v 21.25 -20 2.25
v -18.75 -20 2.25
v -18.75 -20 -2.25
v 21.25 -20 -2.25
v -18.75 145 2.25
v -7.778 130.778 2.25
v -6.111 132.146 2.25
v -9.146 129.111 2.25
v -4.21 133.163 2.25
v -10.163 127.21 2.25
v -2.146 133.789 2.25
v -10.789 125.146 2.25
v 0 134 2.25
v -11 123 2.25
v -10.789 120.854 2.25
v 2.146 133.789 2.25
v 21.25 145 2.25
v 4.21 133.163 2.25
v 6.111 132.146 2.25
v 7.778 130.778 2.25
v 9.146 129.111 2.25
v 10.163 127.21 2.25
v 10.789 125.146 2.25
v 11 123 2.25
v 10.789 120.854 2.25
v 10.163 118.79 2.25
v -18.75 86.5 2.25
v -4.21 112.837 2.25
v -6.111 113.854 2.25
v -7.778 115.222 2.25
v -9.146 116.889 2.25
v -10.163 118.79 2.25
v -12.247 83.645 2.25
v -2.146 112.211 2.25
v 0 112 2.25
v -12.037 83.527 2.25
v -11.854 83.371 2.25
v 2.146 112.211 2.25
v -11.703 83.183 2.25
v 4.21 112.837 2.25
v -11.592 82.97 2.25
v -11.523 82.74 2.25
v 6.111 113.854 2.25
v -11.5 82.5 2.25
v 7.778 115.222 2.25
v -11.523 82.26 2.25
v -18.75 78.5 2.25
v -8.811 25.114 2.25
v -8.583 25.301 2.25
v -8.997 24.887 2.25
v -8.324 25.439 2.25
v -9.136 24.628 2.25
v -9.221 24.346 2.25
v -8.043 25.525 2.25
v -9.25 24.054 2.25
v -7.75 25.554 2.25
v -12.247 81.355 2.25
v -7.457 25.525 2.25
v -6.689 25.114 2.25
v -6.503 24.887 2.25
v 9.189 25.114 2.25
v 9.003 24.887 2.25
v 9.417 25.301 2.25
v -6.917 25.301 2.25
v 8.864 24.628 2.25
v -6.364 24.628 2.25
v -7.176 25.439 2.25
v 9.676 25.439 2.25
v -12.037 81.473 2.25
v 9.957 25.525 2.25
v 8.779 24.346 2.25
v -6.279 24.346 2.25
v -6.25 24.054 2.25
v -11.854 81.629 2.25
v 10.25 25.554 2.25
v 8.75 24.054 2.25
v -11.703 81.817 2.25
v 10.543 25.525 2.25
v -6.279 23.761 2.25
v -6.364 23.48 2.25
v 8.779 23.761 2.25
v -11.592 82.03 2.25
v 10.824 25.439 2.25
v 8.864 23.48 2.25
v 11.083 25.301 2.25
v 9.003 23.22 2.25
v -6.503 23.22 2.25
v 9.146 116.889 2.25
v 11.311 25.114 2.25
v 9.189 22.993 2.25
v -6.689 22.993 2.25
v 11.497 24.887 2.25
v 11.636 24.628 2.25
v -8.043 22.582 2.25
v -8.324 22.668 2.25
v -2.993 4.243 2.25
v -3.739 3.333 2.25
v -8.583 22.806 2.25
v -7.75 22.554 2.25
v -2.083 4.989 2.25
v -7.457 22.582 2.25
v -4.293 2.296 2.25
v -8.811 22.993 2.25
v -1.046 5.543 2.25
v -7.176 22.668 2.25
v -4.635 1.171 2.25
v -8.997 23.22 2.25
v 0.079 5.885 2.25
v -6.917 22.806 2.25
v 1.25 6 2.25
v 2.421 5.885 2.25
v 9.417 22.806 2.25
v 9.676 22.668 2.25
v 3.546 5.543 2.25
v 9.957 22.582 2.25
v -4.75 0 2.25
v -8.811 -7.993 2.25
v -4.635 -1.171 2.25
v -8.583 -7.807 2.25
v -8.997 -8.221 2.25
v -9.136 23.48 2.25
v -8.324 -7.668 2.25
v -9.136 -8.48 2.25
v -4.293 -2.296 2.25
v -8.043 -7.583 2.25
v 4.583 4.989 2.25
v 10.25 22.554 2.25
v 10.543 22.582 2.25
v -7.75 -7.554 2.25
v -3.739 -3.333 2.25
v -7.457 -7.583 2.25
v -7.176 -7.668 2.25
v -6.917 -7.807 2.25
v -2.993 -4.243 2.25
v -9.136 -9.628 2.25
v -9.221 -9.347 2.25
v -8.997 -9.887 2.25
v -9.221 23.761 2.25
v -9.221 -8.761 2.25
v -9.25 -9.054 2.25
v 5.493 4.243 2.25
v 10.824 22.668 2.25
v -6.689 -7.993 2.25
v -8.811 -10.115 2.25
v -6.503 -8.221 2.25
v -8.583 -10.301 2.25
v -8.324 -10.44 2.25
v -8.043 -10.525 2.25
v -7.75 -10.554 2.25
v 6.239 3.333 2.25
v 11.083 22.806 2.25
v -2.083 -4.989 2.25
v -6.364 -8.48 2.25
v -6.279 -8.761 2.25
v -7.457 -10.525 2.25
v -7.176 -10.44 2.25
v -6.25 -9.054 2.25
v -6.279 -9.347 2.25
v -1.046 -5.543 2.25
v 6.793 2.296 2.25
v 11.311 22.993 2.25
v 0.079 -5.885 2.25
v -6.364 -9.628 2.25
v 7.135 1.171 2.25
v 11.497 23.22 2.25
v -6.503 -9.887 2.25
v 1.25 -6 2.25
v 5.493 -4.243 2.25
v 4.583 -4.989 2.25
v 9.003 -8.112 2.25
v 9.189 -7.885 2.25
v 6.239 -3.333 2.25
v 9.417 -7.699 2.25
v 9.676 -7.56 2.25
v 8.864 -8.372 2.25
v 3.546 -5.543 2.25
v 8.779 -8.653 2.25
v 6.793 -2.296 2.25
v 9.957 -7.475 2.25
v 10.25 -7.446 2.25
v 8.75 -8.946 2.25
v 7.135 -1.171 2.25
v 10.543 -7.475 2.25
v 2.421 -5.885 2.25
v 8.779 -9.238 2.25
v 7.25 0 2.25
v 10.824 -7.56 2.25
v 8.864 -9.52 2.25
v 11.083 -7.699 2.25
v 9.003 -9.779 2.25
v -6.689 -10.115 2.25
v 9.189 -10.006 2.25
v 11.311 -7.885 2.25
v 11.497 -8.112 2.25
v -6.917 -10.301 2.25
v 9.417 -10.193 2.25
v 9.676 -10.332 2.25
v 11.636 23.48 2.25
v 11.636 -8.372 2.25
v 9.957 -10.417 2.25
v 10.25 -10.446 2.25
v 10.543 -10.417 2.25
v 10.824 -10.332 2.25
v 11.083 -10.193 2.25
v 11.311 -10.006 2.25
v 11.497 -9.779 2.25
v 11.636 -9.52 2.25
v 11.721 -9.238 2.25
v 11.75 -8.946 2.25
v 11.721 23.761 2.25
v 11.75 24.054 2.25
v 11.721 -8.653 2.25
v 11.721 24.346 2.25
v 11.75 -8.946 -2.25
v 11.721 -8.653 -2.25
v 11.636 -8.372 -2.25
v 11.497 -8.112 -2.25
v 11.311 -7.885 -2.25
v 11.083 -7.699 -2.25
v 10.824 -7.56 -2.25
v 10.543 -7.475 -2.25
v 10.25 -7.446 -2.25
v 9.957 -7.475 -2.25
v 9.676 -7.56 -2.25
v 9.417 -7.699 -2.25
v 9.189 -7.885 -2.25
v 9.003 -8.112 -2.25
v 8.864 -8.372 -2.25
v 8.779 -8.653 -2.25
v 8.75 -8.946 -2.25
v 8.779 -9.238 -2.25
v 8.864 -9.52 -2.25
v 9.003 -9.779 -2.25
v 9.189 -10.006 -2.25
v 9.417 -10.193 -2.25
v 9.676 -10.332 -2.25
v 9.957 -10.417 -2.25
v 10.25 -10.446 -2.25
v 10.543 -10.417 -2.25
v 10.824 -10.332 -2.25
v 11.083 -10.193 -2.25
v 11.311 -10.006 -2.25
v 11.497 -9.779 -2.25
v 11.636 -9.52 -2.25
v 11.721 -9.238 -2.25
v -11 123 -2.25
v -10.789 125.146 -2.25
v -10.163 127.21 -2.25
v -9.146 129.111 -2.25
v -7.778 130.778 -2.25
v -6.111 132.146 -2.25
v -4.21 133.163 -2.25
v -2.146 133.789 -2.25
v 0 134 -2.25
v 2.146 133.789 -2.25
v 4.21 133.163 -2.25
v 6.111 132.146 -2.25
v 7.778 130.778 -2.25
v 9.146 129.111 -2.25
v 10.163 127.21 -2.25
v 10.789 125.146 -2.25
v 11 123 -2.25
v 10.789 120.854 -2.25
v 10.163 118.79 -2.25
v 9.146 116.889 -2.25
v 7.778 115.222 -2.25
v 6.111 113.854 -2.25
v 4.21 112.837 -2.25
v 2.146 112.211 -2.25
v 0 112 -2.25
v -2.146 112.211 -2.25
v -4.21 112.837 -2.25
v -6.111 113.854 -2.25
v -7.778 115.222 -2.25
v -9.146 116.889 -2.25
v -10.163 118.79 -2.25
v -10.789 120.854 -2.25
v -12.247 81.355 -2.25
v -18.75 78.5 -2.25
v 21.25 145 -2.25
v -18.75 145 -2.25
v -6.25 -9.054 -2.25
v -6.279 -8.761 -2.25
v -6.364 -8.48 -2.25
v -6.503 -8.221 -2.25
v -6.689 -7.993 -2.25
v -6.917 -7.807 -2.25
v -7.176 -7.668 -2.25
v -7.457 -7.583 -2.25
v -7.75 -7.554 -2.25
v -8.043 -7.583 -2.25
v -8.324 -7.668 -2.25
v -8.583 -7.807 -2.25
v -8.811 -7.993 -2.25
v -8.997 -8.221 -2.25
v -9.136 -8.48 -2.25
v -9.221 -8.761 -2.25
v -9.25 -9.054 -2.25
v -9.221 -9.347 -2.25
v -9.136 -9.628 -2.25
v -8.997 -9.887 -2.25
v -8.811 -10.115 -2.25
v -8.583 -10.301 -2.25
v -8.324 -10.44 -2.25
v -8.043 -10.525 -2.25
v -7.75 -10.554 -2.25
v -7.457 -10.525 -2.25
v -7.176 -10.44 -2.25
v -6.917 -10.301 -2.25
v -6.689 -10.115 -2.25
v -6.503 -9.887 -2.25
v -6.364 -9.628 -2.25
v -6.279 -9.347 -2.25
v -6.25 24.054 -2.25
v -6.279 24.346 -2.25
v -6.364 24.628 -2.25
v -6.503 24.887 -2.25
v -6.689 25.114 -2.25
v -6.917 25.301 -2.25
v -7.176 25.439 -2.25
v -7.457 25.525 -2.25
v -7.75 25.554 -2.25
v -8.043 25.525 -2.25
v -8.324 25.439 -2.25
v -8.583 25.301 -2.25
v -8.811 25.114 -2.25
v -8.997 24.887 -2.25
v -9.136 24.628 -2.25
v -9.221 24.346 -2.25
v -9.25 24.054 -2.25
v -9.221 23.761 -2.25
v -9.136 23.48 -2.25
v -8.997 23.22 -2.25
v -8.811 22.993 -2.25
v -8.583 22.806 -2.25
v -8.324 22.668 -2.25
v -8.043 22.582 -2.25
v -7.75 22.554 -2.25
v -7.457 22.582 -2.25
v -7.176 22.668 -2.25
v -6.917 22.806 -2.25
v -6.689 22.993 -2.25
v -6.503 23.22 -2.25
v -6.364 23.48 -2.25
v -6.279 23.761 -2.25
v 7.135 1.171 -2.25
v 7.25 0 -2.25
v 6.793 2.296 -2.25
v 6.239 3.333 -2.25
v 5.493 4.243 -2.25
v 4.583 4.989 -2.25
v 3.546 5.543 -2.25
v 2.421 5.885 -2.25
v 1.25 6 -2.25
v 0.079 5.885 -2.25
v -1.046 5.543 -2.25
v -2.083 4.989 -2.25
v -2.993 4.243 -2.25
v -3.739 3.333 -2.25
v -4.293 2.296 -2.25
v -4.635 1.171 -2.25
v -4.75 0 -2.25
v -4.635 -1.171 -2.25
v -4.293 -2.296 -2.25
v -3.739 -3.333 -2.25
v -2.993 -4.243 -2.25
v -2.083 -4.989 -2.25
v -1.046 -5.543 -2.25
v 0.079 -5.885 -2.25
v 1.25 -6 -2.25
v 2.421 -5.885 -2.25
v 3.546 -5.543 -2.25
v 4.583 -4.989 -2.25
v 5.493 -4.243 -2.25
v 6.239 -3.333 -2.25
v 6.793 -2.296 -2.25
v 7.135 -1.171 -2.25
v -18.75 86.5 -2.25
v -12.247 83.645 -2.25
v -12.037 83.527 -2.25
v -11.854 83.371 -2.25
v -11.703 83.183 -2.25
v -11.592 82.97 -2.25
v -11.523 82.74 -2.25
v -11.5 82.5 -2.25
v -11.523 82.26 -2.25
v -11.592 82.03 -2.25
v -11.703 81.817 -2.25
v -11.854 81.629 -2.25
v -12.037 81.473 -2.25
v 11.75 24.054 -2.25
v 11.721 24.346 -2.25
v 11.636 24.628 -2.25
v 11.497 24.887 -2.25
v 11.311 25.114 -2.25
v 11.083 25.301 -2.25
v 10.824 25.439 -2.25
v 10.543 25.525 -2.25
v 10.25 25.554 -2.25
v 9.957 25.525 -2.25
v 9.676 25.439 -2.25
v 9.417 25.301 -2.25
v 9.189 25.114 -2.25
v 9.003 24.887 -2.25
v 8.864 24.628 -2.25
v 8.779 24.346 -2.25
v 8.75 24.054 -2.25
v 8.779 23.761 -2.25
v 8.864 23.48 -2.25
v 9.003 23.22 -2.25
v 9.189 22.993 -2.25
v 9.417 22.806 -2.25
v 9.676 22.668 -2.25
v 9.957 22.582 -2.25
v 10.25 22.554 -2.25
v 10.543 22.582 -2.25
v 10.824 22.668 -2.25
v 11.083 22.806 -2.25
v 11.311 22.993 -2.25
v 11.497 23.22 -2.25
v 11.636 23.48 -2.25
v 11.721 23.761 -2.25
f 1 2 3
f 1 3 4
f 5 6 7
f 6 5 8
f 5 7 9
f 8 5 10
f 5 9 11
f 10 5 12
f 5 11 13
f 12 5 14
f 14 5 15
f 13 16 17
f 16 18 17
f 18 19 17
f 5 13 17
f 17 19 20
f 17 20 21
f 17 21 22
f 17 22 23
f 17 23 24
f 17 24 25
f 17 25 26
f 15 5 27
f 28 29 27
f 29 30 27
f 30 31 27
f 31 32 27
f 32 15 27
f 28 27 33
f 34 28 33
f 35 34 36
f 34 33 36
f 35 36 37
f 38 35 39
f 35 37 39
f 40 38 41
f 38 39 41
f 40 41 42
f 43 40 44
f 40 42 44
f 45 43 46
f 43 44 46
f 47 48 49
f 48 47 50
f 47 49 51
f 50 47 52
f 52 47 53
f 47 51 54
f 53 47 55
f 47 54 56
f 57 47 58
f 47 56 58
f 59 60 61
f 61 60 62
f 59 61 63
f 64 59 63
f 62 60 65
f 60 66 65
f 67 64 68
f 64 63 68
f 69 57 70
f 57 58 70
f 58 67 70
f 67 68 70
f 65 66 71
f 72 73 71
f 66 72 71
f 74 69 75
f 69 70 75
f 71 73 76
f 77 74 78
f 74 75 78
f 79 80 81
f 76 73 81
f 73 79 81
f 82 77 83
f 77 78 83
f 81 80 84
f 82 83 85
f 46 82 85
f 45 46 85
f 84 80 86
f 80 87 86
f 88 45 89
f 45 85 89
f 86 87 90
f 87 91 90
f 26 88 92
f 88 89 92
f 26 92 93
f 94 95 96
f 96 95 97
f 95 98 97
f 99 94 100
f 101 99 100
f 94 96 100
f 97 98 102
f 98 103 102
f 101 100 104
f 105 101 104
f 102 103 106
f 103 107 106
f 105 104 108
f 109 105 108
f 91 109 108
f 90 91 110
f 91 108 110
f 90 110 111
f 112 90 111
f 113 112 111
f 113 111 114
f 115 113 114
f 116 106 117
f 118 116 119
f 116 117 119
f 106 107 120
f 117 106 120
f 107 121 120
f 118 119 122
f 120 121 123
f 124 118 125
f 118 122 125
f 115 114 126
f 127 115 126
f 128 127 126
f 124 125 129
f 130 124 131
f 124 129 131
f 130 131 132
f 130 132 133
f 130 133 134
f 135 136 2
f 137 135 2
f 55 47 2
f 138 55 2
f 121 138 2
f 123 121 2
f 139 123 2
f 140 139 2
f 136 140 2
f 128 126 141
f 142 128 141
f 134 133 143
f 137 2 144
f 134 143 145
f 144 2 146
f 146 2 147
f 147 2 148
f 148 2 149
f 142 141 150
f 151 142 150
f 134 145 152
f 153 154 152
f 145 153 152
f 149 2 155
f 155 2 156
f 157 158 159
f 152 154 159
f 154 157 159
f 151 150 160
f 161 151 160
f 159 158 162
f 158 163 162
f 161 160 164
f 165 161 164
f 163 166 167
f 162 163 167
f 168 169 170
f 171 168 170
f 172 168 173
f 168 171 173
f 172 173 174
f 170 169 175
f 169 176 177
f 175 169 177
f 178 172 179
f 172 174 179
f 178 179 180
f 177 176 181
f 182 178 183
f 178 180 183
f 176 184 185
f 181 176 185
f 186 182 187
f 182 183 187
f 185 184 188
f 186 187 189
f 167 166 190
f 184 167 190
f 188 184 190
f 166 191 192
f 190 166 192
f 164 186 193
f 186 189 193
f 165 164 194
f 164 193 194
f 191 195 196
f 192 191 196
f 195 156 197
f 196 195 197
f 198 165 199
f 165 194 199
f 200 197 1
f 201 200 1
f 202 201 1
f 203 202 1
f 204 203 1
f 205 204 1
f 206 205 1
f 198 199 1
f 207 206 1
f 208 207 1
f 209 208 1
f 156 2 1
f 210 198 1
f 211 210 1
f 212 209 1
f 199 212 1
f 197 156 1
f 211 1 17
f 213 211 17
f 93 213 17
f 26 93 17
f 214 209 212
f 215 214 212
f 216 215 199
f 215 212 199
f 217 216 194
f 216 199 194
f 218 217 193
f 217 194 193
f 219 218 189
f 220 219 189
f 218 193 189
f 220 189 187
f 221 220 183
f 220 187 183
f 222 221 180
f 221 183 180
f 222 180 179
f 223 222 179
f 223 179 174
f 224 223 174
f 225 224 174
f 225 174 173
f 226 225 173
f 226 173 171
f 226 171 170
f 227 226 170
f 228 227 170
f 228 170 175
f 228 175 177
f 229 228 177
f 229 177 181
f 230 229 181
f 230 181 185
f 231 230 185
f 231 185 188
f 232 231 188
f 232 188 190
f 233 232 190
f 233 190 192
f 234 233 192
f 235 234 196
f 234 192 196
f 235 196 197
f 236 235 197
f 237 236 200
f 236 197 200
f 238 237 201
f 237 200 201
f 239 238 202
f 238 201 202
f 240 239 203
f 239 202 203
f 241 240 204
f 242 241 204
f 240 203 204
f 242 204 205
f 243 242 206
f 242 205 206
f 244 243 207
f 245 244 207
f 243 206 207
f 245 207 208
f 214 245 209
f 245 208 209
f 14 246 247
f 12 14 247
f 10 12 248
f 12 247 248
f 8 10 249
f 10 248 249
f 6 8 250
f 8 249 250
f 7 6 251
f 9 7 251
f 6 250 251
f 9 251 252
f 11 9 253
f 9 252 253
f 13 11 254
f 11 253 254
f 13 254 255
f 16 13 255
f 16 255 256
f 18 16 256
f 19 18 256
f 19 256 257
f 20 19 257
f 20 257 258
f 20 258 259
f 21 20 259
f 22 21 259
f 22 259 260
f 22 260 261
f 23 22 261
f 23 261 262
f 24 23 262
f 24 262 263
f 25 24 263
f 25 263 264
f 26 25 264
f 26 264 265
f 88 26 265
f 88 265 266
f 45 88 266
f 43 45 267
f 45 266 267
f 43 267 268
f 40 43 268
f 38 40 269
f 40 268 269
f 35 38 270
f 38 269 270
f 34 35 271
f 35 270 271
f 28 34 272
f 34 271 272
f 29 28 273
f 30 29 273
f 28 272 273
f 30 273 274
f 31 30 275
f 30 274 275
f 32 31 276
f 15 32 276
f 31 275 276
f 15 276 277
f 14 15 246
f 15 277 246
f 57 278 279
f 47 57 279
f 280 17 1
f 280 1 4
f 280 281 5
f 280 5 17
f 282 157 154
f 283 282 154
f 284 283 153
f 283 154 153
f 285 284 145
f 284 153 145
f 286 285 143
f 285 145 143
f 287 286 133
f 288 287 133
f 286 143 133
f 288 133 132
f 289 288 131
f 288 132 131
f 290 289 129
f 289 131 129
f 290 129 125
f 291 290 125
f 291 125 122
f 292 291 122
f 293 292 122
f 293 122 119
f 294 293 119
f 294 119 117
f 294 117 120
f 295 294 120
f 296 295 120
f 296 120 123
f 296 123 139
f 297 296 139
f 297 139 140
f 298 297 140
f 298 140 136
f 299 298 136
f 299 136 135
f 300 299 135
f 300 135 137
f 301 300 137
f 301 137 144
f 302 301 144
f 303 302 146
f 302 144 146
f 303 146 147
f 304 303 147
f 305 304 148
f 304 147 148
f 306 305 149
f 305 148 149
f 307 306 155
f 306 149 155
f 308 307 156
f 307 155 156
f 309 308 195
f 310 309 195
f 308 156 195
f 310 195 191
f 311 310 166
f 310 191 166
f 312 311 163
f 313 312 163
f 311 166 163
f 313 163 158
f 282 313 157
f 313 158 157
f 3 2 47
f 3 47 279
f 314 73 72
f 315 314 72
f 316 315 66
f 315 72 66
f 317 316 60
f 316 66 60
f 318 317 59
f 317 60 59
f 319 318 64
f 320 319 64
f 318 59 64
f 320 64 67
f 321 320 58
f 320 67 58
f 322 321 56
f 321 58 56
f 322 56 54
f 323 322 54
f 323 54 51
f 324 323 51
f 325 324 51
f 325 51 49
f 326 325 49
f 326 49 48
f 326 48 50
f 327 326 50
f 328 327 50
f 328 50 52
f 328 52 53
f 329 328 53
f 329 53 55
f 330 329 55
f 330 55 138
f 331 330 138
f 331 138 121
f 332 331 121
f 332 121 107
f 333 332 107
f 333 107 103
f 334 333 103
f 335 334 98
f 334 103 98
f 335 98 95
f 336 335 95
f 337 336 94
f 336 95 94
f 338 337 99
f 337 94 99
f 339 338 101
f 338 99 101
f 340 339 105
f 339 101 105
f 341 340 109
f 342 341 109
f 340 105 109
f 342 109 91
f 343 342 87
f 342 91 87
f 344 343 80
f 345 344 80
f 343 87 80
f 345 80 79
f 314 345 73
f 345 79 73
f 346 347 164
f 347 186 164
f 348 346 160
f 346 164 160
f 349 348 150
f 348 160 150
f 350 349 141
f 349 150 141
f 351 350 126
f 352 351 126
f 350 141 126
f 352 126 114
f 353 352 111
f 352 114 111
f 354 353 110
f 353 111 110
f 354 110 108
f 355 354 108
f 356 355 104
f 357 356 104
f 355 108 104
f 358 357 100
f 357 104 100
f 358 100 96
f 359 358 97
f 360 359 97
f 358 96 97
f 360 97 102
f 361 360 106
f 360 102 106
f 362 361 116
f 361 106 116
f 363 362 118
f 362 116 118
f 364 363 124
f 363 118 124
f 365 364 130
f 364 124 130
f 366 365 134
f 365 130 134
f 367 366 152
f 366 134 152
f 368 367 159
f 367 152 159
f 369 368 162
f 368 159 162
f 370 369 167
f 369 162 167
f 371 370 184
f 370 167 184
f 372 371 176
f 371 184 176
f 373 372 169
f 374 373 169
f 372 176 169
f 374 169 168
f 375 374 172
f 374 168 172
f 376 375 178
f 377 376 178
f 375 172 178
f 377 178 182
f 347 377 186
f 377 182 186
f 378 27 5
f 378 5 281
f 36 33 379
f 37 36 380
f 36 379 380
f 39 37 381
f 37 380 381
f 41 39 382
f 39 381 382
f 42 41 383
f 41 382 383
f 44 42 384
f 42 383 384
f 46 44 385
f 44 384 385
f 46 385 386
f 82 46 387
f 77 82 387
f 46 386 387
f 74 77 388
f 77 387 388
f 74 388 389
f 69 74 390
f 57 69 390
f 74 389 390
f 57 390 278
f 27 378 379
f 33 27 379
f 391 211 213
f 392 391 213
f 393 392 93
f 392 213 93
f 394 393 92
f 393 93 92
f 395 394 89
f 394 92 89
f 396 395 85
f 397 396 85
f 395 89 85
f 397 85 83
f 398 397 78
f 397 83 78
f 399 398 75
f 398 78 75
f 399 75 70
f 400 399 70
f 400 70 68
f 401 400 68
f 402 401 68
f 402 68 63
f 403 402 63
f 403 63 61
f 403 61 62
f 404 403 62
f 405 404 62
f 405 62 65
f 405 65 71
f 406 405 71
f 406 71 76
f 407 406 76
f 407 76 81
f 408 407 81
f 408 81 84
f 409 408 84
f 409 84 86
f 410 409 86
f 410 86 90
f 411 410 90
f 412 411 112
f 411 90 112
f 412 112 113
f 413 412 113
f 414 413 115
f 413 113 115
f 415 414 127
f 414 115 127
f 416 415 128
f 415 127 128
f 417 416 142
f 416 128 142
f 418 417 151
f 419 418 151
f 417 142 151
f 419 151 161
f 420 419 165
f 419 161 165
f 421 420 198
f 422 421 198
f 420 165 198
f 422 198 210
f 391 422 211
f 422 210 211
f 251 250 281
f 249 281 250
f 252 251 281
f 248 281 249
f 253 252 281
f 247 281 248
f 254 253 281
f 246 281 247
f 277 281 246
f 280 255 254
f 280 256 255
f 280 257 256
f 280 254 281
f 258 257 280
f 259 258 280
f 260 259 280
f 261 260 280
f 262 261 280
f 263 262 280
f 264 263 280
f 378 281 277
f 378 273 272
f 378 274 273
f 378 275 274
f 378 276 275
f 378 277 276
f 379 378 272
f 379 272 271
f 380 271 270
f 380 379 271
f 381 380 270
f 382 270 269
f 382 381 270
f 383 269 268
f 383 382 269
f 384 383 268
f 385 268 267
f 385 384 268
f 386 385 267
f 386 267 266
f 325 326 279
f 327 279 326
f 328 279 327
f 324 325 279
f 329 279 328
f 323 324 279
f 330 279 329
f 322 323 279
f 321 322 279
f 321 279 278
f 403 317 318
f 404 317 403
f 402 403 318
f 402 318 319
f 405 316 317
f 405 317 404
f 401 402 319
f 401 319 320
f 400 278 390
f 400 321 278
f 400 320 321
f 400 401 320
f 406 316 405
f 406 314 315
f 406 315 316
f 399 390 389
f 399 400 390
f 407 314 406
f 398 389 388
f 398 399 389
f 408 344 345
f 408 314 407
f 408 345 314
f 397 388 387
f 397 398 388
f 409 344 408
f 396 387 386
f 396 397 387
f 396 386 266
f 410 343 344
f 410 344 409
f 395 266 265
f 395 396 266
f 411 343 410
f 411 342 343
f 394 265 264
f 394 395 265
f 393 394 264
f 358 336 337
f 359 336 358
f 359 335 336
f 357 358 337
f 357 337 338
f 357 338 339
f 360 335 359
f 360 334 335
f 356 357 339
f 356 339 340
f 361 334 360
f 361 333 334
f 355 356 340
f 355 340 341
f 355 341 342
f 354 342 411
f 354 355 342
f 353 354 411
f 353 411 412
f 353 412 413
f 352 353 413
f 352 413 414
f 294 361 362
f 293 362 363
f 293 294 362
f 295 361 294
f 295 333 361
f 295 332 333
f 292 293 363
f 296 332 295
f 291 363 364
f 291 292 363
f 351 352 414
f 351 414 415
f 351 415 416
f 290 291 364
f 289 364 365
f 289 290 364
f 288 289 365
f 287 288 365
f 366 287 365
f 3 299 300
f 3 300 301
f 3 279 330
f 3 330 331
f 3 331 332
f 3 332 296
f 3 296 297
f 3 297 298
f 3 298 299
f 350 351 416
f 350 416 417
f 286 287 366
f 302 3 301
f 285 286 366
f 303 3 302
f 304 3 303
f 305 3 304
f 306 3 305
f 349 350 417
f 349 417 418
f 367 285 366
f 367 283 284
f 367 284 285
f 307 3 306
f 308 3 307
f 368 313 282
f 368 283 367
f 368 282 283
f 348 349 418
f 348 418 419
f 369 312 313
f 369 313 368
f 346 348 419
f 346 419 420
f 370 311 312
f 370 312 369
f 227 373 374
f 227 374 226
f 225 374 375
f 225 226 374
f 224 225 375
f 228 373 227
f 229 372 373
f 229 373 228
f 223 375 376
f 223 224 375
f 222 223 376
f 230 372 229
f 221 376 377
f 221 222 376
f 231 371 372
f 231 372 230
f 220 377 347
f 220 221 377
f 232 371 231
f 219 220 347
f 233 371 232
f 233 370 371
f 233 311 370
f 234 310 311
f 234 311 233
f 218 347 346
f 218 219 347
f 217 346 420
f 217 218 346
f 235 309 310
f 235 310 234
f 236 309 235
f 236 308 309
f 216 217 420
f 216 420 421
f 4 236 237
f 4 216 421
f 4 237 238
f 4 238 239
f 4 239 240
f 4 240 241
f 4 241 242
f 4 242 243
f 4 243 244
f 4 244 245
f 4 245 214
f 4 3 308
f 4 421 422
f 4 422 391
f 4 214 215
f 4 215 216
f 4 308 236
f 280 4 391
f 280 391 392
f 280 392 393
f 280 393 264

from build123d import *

# Parameters (mm, degrees)
SKETCH1_W           = 42.5
SKETCH1_H           = 40
BOSS_EXTRUDE1_DEPTH = 2.25
SKETCH3_R           = 6
CUT_EXTRUDE2_DEPTH  = 5
SKETCH4_W           = 42.5
SKETCH4_H           = 4.5
BOSS_EXTRUDE2_DEPTH = 15
SKETCH7_R           = 1.5
CUT_EXTRUDE3_DEPTH  = 10
SKETCH8_W           = 2.5
SKETCH8_H           = 55
CUT_EXTRUDE4_DEPTH  = 10
SKETCH9_W           = 40
SKETCH9_H           = 4.5
BOSS_EXTRUDE3_DEPTH = 110
SKETCH11_R          = 11
CUT_EXTRUDE5_DEPTH  = 100
CUT_EXTRUDE6_DEPTH  = 100


with BuildPart() as part:
    # Sketch1 → Boss-Extrude1 (new, symmetric)
    with BuildSketch(Plane.XY):
        Rectangle(SKETCH1_W, SKETCH1_H)
    extrude(amount=BOSS_EXTRUDE1_DEPTH, both=True)

    # Sketch3 → Cut-Extrude2 (cut, symmetric)
    with BuildSketch(Plane.XY.offset(2.25)):
        with Locations((1.25, 0)):
            Circle(SKETCH3_R)
    extrude(amount=CUT_EXTRUDE2_DEPTH, both=True, mode=Mode.SUBTRACT)

    # Sketch4 → Boss-Extrude2 (add)
    with BuildSketch(Plane(origin=(0, 20, 0), x_dir=(1, 0, 0), z_dir=(0, 1, 0))):
        Rectangle(SKETCH4_W, SKETCH4_H)
    extrude(amount=BOSS_EXTRUDE2_DEPTH)

    # Sketch7 → Cut-Extrude3 (cut)
    with BuildSketch(Plane.XY.offset(2.25)):
        with Locations((-7.75, 24.053632735)):
            Circle(SKETCH7_R)
        with Locations((10.25, 24.053632735)):
            Circle(SKETCH7_R)
        with Locations((10.25, -8.945771811)):
            Circle(SKETCH7_R)
        with Locations((-7.75, -9.053903396)):
            Circle(SKETCH7_R)
    extrude(amount=-CUT_EXTRUDE3_DEPTH, mode=Mode.SUBTRACT)

    # Sketch8 → Cut-Extrude4 (cut)
    with BuildSketch(Plane.XY.offset(2.25)):
        with Locations((-20, 7.5)):
            Rectangle(SKETCH8_W, SKETCH8_H)
    extrude(amount=-CUT_EXTRUDE4_DEPTH, mode=Mode.SUBTRACT)

    # Sketch9 → Boss-Extrude3 (add)
    with BuildSketch(Plane(origin=(0, 35, 0), x_dir=(1, 0, 0), z_dir=(0, 1, 0))):
        with Locations((1.25, 0)):
            Rectangle(SKETCH9_W, SKETCH9_H)
    extrude(amount=BOSS_EXTRUDE3_DEPTH)

    # Sketch11 → Cut-Extrude5 (cut)
    with BuildSketch(Plane(origin=(0, 0, -2.25), x_dir=(-1, 0, 0), z_dir=(0, 0, -1))):
        with Locations((0, 123)):
            Circle(SKETCH11_R)
    extrude(amount=-CUT_EXTRUDE5_DEPTH, mode=Mode.SUBTRACT)

    # Sketch12 → Cut-Extrude6 (cut)
    with BuildSketch(Plane(origin=(0, 0, -2.25), x_dir=(-1, 0, 0), z_dir=(0, 0, -1))):
        with BuildLine():
            Line((18.75, 78.5), (18.75, 86.5))
            Line((18.75, 86.5), (12.247409999, 83.644510066))
            ThreePointArc((12.247409999, 83.644510066), (11.5, 82.499999945), (12.2474101, 81.35548989))
            Line((12.2474101, 81.35548989), (18.75, 78.5))
        make_face()
    extrude(amount=-CUT_EXTRUDE6_DEPTH, mode=Mode.SUBTRACT)


solid = part.part
